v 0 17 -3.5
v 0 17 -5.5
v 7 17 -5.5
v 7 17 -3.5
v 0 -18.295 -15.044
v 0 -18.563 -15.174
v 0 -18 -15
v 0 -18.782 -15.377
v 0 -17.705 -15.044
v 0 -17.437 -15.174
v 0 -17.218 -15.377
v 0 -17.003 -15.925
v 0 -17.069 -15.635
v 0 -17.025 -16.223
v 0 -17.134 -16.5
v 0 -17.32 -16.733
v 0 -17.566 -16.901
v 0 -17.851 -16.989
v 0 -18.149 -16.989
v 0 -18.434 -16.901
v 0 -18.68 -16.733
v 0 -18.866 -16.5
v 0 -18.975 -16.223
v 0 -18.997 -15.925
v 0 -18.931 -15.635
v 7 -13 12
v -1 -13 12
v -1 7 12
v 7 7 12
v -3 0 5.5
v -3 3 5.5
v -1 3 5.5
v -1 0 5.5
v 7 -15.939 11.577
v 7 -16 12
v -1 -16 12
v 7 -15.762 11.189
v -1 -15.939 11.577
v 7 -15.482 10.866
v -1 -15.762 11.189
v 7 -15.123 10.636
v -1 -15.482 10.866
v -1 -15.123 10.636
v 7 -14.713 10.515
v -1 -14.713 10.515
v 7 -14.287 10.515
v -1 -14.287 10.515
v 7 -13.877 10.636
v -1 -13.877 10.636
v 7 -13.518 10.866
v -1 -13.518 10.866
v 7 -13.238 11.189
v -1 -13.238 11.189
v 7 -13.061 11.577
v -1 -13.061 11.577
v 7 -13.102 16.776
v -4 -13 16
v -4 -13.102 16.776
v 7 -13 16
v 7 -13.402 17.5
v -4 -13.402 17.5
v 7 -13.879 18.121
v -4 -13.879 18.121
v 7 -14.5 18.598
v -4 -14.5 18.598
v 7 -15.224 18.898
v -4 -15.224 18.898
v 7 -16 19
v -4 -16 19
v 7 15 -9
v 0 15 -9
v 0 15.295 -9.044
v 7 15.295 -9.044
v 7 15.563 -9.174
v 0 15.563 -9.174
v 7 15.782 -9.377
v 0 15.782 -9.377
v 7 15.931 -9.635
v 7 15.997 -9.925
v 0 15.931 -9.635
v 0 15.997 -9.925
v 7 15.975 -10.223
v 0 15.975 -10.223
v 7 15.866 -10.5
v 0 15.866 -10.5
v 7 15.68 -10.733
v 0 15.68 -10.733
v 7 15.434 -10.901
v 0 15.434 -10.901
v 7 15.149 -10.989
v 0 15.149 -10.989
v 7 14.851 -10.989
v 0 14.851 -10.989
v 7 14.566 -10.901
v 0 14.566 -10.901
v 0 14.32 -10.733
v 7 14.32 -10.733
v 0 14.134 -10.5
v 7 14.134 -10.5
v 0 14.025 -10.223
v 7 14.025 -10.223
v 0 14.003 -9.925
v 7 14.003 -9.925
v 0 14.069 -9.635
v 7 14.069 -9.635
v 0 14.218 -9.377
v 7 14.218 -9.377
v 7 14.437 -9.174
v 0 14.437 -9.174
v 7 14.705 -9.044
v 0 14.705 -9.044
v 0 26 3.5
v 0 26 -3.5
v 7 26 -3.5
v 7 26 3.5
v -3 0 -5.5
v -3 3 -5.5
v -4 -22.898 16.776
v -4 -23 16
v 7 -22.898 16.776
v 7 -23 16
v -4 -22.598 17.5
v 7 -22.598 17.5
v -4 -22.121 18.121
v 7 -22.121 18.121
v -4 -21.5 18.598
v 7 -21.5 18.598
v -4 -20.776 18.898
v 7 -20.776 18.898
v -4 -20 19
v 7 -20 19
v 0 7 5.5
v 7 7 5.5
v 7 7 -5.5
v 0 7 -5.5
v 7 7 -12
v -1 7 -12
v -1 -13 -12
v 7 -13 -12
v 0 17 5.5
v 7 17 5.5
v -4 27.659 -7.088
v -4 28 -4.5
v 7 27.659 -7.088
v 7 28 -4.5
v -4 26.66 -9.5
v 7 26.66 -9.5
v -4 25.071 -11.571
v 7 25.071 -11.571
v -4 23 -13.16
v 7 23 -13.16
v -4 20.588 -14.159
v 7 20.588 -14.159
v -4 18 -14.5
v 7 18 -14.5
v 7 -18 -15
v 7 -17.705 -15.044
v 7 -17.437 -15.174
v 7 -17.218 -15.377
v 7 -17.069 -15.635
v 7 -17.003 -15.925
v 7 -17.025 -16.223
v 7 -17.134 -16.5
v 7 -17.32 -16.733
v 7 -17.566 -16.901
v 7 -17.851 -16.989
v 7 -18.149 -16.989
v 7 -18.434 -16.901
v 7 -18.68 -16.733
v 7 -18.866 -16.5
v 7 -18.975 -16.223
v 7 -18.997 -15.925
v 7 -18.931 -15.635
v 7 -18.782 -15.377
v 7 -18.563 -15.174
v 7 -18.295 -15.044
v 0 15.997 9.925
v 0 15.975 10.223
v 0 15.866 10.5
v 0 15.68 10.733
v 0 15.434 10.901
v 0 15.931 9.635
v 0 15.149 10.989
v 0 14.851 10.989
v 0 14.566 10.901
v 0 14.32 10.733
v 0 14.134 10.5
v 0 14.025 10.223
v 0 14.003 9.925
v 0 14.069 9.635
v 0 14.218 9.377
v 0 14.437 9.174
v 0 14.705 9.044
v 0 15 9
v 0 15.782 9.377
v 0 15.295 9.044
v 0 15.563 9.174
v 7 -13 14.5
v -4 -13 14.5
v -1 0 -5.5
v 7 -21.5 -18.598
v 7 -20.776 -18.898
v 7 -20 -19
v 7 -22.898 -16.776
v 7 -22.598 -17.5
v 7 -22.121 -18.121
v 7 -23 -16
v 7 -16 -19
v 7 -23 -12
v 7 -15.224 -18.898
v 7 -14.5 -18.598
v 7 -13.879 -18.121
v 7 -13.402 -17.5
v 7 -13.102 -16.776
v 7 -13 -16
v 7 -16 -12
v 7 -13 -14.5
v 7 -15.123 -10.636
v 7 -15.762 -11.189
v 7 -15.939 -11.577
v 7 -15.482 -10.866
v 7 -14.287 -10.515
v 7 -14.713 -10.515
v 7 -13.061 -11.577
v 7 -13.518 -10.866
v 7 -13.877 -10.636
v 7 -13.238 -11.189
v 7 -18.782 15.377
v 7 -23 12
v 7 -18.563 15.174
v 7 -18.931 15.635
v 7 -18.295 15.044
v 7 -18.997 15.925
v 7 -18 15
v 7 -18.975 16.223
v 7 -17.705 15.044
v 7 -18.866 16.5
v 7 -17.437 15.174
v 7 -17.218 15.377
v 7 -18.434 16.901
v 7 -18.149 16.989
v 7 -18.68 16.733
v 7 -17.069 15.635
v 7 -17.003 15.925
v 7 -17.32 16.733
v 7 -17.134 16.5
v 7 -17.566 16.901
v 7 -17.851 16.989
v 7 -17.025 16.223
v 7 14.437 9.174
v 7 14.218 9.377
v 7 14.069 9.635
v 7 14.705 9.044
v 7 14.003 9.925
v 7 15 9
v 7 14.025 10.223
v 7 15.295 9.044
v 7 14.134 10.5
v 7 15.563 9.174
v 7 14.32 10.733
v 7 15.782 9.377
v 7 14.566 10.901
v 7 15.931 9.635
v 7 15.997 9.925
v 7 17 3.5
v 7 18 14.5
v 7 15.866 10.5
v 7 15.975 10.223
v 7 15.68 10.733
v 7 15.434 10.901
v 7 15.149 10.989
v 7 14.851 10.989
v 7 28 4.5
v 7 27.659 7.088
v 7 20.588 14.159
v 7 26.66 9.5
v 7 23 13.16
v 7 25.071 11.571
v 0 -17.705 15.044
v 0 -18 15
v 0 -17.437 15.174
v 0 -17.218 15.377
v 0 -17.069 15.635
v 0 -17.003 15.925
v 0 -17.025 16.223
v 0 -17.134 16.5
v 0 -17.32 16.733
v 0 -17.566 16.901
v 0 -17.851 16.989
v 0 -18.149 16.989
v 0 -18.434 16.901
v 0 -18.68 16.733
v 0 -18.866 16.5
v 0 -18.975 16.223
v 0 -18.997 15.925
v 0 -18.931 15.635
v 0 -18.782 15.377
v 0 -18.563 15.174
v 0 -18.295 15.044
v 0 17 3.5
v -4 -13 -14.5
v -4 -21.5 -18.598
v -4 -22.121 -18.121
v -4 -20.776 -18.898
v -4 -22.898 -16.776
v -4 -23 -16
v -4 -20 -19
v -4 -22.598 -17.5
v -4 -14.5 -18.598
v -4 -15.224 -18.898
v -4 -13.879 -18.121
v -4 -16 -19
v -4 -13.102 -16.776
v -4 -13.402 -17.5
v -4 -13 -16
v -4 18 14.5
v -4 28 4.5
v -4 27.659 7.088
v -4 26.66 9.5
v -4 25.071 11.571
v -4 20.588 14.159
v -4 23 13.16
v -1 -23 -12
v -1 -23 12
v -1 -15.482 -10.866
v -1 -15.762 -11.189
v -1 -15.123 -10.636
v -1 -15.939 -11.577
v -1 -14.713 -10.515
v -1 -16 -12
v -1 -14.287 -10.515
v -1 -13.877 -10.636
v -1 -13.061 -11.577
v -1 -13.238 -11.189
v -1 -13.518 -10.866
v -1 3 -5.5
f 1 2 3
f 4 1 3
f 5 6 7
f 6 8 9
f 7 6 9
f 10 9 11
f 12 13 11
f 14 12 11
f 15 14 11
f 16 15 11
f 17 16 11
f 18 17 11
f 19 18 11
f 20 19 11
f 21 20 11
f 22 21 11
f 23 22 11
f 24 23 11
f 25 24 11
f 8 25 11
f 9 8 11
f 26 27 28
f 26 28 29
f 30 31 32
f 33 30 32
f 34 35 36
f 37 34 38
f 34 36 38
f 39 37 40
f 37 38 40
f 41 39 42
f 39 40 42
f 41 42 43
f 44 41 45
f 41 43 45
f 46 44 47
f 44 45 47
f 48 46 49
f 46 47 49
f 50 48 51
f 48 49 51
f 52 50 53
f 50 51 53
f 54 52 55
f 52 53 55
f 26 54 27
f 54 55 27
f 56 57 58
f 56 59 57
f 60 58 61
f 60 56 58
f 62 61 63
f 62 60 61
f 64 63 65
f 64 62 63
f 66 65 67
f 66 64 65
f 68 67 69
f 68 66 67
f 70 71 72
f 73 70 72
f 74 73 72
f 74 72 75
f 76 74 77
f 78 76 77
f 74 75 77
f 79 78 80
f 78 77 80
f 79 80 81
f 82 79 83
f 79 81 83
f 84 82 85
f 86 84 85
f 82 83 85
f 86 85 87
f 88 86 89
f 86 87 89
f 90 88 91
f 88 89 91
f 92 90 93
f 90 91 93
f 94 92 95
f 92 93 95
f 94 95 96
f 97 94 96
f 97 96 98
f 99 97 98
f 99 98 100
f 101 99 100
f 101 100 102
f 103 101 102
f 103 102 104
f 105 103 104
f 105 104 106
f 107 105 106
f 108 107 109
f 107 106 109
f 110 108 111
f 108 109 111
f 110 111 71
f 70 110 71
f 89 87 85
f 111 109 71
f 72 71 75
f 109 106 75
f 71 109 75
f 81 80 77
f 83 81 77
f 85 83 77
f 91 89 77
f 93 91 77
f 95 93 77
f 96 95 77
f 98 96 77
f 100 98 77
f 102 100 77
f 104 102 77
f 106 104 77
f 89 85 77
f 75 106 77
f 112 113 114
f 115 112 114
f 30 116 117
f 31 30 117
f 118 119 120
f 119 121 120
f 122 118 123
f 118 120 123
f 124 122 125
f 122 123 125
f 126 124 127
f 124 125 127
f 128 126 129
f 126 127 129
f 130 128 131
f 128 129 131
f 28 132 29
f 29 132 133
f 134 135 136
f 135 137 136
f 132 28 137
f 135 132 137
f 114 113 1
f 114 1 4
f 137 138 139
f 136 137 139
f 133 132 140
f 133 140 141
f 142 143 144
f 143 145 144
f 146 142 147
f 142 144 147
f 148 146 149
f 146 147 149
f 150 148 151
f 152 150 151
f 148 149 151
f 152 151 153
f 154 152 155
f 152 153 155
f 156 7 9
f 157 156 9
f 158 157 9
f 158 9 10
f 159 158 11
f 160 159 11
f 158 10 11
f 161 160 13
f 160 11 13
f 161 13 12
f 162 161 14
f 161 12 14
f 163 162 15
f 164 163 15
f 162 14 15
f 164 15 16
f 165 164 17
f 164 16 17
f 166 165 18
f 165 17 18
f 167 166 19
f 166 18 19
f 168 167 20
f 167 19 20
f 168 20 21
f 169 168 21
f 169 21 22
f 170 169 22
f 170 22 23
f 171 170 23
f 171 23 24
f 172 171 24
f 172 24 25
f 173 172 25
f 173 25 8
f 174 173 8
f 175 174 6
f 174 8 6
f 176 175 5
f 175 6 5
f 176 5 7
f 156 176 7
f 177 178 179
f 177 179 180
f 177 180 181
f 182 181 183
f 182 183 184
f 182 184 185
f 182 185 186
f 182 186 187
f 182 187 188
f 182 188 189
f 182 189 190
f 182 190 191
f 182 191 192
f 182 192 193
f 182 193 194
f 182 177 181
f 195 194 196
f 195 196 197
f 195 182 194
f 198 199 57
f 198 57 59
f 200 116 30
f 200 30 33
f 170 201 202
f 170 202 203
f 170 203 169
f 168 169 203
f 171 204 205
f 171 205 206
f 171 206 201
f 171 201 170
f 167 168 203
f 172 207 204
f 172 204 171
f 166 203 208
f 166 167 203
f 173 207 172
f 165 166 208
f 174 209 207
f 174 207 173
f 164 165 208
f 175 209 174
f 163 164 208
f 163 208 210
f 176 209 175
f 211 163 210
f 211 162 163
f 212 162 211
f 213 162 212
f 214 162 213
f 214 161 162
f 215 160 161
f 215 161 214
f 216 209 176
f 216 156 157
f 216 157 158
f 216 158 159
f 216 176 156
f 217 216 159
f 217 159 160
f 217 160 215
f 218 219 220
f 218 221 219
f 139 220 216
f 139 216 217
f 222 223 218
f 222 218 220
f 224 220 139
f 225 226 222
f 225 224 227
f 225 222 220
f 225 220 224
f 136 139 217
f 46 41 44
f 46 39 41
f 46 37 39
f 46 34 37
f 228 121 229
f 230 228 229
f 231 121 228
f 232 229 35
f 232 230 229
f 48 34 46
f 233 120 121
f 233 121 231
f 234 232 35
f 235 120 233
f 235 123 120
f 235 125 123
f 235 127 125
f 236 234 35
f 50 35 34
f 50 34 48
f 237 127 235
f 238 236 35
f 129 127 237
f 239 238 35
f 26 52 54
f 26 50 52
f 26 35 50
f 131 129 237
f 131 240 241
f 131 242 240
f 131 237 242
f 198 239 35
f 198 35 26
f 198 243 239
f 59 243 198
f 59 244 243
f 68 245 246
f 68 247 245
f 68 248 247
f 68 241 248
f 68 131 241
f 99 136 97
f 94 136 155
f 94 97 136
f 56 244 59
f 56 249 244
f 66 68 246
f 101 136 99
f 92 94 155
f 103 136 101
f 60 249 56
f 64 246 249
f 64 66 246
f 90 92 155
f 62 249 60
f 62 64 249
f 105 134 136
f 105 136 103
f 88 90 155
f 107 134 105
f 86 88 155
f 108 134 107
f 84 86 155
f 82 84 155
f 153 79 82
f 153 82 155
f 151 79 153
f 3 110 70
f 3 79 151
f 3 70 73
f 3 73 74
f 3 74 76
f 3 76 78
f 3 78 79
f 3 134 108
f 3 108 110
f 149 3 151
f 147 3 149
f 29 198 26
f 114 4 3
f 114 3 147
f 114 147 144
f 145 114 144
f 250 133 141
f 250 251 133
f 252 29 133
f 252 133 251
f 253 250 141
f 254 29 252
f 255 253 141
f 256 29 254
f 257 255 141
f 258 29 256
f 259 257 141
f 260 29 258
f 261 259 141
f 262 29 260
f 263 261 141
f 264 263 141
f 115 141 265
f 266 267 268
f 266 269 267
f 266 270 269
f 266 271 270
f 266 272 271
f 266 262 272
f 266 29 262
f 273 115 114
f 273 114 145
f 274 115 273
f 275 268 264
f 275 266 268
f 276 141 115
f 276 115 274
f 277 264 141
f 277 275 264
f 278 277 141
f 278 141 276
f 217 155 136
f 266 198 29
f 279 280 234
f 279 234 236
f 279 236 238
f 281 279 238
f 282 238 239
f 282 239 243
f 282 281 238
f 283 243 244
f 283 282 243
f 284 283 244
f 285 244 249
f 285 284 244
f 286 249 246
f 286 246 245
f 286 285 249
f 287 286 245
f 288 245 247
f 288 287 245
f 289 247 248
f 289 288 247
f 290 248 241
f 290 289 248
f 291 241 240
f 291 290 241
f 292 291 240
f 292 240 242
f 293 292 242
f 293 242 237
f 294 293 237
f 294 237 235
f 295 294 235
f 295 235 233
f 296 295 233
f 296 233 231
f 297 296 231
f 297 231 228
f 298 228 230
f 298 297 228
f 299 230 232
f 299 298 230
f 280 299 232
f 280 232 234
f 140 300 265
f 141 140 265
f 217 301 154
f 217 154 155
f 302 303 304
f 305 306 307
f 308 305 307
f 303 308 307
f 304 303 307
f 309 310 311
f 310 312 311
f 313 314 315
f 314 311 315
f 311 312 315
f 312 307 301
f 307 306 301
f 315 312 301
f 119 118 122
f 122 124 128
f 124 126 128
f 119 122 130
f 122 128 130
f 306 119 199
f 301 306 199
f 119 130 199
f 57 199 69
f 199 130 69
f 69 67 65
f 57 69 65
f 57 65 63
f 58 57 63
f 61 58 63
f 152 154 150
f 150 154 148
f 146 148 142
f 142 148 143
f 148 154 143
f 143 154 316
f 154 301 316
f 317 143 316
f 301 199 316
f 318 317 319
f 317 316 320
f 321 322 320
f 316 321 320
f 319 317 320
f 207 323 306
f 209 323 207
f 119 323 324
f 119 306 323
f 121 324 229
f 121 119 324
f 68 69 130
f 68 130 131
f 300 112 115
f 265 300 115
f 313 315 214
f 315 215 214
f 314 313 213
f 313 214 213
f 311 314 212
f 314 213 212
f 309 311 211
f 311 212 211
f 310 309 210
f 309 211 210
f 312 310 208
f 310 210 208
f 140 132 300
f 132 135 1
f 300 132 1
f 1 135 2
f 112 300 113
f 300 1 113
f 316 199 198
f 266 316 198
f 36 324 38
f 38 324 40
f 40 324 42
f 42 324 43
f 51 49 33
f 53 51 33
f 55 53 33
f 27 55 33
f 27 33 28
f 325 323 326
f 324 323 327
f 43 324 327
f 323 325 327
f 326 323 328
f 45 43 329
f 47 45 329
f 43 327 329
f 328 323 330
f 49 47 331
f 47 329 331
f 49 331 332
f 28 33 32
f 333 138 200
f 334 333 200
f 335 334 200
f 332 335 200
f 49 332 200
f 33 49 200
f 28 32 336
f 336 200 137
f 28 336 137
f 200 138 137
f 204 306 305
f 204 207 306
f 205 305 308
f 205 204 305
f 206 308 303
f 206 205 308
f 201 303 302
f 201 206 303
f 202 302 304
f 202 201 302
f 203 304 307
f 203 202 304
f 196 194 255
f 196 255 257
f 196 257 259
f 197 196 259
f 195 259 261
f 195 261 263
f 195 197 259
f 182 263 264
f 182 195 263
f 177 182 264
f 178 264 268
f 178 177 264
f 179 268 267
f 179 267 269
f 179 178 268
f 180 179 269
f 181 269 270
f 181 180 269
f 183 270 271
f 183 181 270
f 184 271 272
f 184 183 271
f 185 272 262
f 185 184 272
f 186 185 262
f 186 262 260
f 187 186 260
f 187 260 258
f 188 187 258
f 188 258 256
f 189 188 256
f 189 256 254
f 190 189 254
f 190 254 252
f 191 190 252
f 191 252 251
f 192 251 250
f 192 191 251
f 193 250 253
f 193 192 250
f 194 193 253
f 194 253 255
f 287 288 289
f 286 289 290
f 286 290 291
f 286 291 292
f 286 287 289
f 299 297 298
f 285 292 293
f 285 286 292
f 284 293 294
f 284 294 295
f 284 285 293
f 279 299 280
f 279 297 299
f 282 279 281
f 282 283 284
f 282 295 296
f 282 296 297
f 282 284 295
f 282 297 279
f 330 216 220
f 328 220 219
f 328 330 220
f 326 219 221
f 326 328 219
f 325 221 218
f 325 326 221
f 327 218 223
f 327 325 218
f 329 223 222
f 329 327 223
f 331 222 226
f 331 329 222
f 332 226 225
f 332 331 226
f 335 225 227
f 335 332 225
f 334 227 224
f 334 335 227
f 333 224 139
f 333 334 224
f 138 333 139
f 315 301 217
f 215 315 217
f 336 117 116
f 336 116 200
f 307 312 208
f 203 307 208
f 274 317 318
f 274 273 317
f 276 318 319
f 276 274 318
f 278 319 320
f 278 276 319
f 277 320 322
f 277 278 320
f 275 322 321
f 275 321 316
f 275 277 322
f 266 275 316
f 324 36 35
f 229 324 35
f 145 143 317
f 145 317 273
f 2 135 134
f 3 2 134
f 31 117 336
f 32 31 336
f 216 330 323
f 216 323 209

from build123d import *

# Parameters (mm, degrees)
CYLINDER_R        = 1.5
CYLINDER_DEPTH    = 8
CYLINDER002_R     = 1
CYLINDER002_DEPTH = 7
BOX005_W          = 11
BOX005_H          = 10
BOX005_DEPTH      = 6
FILLET001_R       = 3
BOX_W             = 14
BOX_H             = 30
BOX_DEPTH         = 24
BOX003_W          = 11
BOX003_H          = 3
BOX003_DEPTH      = 11
BOX004_W          = 11
BOX004_H          = 9
BOX004_DEPTH      = 7
CYLINDER001_R     = 1
CYLINDER001_DEPTH = 7
BOX002_W          = 11
BOX002_H          = 10
BOX002_DEPTH      = 11
BOX001_W          = 11
BOX001_H          = 51
BOX001_DEPTH      = 29
FILLET_R          = 10


with BuildPart() as side_cylinder:
    # Cylinder → Cylinder (new body)
    with BuildSketch(Plane(origin=(-1, -14.5, 12), x_dir=(0, 0, -1), z_dir=(1, 0, 0))):
        Circle(CYLINDER_R)
    extrude(amount=CYLINDER_DEPTH)


with BuildPart() as part_mirroring:
    # Part__Mirroring: instance of side cylinder
    add(side_cylinder.part.mirror(Plane(origin=(0, 0, 0), x_dir=(0, 1, 0), z_dir=(0, 0, 1))))


with BuildPart() as screw_hole_cylinder001:
    # Cylinder002 → Cylinder002 (new body)
    with BuildSketch(Plane(origin=(0, -18, 16), x_dir=(0, 0, -1), z_dir=(1, 0, 0))):
        Circle(CYLINDER002_R)
    extrude(amount=CYLINDER002_DEPTH)


with BuildPart() as cut001:
    # Box005 → Box005 (new body)
    with BuildSketch(Plane(origin=(-4, -23, 13), x_dir=(1, 0, 0), z_dir=(0, 0, 1))):
        with Locations((5.5, 5)):
            Rectangle(BOX005_W, BOX005_H)
    extrude(amount=BOX005_DEPTH)

    # Fillet001
    fillet001_edges = [cut001.edges().sort_by_distance(p)[0] for p in [
        (1.5, -23, 19),
        (1.5, -13, 19),
    ]]
    fillet(fillet001_edges, radius=FILLET001_R)

    # Cut001: cut screw hole cylinder001
    add(screw_hole_cylinder001.part, mode=Mode.SUBTRACT)


with BuildPart() as part_mirroring002:
    # Part__Mirroring002: instance of Cut001
    add(cut001.part.mirror(Plane(origin=(0, 0, 0), x_dir=(0, 1, 0), z_dir=(0, 0, 1))))


with BuildPart() as extract_cube:
    # Box → Box (new body)
    with BuildSketch(Plane(origin=(-1, -23, -12), x_dir=(1, 0, 0), z_dir=(0, 0, 1))):
        with Locations((7, 15)):
            Rectangle(BOX_W, BOX_H)
    extrude(amount=BOX_DEPTH)


with BuildPart() as pins_extraction_cube:
    # Box003 → Box003 (new body)
    with BuildSketch(Plane(origin=(-3, 0, -5.5), x_dir=(1, 0, 0), z_dir=(0, 0, 1))):
        with Locations((5.5, 1.5)):
            Rectangle(BOX003_W, BOX003_H)
    extrude(amount=BOX003_DEPTH)


with BuildPart() as wire_extract_cube:
    # Box004 → Box004 (new body)
    with BuildSketch(Plane(origin=(0, 17, -3.5), x_dir=(1, 0, 0), z_dir=(0, 0, 1))):
        with Locations((5.5, 4.5)):
            Rectangle(BOX004_W, BOX004_H)
    extrude(amount=BOX004_DEPTH)


with BuildPart() as screw_hole_cylinder:
    # Cylinder001 → Cylinder001 (new body)
    with BuildSketch(Plane(origin=(0, 15, 10), x_dir=(0, 0, -1), z_dir=(1, 0, 0))):
        Circle(CYLINDER001_R)
    extrude(amount=CYLINDER001_DEPTH)


with BuildPart() as part_mirroring001:
    # Part__Mirroring001: instance of screw hole cylinder
    add(screw_hole_cylinder.part.mirror(Plane(origin=(0, 0, 0), x_dir=(0, 1, 0), z_dir=(0, 0, 1))))


with BuildPart() as extract_fusion:
    # Box002 → Box002 (new body)
    with BuildSketch(Plane(origin=(0, 7, -5.5), x_dir=(1, 0, 0), z_dir=(0, 0, 1))):
        with Locations((5.5, 5)):
            Rectangle(BOX002_W, BOX002_H)
    extrude(amount=BOX002_DEPTH)

    # Fusion: union extract cube, pins extraction cube, wire extract cube, Part__Mirroring001, screw hole cylinder
    add(extract_cube.part)
    add(pins_extraction_cube.part)
    add(wire_extract_cube.part)
    add(part_mirroring001.part)
    add(screw_hole_cylinder.part)


with BuildPart() as body_fusion:
    # Box001 → Box001 (new body)
    with BuildSketch(Plane(origin=(-4, -23, -14.5), x_dir=(1, 0, 0), z_dir=(0, 0, 1))):
        with Locations((5.5, 25.5)):
            Rectangle(BOX001_W, BOX001_H)
    extrude(amount=BOX001_DEPTH)

    # Fillet
    fillet_edges = [body_fusion.edges().sort_by_distance(p)[0] for p in [
        (1.5, 28, -14.5),
        (1.5, 28, 14.5),
    ]]
    fillet(fillet_edges, radius=FILLET_R)

    # Cut: cut extract fusion
    add(extract_fusion.part, mode=Mode.SUBTRACT)

    # Fusion001: union Part__Mirroring, side cylinder, Part__Mirroring002, Cut001
    add(part_mirroring.part)
    add(side_cylinder.part)
    add(part_mirroring002.part)
    add(cut001.part)


solid = body_fusion.part
